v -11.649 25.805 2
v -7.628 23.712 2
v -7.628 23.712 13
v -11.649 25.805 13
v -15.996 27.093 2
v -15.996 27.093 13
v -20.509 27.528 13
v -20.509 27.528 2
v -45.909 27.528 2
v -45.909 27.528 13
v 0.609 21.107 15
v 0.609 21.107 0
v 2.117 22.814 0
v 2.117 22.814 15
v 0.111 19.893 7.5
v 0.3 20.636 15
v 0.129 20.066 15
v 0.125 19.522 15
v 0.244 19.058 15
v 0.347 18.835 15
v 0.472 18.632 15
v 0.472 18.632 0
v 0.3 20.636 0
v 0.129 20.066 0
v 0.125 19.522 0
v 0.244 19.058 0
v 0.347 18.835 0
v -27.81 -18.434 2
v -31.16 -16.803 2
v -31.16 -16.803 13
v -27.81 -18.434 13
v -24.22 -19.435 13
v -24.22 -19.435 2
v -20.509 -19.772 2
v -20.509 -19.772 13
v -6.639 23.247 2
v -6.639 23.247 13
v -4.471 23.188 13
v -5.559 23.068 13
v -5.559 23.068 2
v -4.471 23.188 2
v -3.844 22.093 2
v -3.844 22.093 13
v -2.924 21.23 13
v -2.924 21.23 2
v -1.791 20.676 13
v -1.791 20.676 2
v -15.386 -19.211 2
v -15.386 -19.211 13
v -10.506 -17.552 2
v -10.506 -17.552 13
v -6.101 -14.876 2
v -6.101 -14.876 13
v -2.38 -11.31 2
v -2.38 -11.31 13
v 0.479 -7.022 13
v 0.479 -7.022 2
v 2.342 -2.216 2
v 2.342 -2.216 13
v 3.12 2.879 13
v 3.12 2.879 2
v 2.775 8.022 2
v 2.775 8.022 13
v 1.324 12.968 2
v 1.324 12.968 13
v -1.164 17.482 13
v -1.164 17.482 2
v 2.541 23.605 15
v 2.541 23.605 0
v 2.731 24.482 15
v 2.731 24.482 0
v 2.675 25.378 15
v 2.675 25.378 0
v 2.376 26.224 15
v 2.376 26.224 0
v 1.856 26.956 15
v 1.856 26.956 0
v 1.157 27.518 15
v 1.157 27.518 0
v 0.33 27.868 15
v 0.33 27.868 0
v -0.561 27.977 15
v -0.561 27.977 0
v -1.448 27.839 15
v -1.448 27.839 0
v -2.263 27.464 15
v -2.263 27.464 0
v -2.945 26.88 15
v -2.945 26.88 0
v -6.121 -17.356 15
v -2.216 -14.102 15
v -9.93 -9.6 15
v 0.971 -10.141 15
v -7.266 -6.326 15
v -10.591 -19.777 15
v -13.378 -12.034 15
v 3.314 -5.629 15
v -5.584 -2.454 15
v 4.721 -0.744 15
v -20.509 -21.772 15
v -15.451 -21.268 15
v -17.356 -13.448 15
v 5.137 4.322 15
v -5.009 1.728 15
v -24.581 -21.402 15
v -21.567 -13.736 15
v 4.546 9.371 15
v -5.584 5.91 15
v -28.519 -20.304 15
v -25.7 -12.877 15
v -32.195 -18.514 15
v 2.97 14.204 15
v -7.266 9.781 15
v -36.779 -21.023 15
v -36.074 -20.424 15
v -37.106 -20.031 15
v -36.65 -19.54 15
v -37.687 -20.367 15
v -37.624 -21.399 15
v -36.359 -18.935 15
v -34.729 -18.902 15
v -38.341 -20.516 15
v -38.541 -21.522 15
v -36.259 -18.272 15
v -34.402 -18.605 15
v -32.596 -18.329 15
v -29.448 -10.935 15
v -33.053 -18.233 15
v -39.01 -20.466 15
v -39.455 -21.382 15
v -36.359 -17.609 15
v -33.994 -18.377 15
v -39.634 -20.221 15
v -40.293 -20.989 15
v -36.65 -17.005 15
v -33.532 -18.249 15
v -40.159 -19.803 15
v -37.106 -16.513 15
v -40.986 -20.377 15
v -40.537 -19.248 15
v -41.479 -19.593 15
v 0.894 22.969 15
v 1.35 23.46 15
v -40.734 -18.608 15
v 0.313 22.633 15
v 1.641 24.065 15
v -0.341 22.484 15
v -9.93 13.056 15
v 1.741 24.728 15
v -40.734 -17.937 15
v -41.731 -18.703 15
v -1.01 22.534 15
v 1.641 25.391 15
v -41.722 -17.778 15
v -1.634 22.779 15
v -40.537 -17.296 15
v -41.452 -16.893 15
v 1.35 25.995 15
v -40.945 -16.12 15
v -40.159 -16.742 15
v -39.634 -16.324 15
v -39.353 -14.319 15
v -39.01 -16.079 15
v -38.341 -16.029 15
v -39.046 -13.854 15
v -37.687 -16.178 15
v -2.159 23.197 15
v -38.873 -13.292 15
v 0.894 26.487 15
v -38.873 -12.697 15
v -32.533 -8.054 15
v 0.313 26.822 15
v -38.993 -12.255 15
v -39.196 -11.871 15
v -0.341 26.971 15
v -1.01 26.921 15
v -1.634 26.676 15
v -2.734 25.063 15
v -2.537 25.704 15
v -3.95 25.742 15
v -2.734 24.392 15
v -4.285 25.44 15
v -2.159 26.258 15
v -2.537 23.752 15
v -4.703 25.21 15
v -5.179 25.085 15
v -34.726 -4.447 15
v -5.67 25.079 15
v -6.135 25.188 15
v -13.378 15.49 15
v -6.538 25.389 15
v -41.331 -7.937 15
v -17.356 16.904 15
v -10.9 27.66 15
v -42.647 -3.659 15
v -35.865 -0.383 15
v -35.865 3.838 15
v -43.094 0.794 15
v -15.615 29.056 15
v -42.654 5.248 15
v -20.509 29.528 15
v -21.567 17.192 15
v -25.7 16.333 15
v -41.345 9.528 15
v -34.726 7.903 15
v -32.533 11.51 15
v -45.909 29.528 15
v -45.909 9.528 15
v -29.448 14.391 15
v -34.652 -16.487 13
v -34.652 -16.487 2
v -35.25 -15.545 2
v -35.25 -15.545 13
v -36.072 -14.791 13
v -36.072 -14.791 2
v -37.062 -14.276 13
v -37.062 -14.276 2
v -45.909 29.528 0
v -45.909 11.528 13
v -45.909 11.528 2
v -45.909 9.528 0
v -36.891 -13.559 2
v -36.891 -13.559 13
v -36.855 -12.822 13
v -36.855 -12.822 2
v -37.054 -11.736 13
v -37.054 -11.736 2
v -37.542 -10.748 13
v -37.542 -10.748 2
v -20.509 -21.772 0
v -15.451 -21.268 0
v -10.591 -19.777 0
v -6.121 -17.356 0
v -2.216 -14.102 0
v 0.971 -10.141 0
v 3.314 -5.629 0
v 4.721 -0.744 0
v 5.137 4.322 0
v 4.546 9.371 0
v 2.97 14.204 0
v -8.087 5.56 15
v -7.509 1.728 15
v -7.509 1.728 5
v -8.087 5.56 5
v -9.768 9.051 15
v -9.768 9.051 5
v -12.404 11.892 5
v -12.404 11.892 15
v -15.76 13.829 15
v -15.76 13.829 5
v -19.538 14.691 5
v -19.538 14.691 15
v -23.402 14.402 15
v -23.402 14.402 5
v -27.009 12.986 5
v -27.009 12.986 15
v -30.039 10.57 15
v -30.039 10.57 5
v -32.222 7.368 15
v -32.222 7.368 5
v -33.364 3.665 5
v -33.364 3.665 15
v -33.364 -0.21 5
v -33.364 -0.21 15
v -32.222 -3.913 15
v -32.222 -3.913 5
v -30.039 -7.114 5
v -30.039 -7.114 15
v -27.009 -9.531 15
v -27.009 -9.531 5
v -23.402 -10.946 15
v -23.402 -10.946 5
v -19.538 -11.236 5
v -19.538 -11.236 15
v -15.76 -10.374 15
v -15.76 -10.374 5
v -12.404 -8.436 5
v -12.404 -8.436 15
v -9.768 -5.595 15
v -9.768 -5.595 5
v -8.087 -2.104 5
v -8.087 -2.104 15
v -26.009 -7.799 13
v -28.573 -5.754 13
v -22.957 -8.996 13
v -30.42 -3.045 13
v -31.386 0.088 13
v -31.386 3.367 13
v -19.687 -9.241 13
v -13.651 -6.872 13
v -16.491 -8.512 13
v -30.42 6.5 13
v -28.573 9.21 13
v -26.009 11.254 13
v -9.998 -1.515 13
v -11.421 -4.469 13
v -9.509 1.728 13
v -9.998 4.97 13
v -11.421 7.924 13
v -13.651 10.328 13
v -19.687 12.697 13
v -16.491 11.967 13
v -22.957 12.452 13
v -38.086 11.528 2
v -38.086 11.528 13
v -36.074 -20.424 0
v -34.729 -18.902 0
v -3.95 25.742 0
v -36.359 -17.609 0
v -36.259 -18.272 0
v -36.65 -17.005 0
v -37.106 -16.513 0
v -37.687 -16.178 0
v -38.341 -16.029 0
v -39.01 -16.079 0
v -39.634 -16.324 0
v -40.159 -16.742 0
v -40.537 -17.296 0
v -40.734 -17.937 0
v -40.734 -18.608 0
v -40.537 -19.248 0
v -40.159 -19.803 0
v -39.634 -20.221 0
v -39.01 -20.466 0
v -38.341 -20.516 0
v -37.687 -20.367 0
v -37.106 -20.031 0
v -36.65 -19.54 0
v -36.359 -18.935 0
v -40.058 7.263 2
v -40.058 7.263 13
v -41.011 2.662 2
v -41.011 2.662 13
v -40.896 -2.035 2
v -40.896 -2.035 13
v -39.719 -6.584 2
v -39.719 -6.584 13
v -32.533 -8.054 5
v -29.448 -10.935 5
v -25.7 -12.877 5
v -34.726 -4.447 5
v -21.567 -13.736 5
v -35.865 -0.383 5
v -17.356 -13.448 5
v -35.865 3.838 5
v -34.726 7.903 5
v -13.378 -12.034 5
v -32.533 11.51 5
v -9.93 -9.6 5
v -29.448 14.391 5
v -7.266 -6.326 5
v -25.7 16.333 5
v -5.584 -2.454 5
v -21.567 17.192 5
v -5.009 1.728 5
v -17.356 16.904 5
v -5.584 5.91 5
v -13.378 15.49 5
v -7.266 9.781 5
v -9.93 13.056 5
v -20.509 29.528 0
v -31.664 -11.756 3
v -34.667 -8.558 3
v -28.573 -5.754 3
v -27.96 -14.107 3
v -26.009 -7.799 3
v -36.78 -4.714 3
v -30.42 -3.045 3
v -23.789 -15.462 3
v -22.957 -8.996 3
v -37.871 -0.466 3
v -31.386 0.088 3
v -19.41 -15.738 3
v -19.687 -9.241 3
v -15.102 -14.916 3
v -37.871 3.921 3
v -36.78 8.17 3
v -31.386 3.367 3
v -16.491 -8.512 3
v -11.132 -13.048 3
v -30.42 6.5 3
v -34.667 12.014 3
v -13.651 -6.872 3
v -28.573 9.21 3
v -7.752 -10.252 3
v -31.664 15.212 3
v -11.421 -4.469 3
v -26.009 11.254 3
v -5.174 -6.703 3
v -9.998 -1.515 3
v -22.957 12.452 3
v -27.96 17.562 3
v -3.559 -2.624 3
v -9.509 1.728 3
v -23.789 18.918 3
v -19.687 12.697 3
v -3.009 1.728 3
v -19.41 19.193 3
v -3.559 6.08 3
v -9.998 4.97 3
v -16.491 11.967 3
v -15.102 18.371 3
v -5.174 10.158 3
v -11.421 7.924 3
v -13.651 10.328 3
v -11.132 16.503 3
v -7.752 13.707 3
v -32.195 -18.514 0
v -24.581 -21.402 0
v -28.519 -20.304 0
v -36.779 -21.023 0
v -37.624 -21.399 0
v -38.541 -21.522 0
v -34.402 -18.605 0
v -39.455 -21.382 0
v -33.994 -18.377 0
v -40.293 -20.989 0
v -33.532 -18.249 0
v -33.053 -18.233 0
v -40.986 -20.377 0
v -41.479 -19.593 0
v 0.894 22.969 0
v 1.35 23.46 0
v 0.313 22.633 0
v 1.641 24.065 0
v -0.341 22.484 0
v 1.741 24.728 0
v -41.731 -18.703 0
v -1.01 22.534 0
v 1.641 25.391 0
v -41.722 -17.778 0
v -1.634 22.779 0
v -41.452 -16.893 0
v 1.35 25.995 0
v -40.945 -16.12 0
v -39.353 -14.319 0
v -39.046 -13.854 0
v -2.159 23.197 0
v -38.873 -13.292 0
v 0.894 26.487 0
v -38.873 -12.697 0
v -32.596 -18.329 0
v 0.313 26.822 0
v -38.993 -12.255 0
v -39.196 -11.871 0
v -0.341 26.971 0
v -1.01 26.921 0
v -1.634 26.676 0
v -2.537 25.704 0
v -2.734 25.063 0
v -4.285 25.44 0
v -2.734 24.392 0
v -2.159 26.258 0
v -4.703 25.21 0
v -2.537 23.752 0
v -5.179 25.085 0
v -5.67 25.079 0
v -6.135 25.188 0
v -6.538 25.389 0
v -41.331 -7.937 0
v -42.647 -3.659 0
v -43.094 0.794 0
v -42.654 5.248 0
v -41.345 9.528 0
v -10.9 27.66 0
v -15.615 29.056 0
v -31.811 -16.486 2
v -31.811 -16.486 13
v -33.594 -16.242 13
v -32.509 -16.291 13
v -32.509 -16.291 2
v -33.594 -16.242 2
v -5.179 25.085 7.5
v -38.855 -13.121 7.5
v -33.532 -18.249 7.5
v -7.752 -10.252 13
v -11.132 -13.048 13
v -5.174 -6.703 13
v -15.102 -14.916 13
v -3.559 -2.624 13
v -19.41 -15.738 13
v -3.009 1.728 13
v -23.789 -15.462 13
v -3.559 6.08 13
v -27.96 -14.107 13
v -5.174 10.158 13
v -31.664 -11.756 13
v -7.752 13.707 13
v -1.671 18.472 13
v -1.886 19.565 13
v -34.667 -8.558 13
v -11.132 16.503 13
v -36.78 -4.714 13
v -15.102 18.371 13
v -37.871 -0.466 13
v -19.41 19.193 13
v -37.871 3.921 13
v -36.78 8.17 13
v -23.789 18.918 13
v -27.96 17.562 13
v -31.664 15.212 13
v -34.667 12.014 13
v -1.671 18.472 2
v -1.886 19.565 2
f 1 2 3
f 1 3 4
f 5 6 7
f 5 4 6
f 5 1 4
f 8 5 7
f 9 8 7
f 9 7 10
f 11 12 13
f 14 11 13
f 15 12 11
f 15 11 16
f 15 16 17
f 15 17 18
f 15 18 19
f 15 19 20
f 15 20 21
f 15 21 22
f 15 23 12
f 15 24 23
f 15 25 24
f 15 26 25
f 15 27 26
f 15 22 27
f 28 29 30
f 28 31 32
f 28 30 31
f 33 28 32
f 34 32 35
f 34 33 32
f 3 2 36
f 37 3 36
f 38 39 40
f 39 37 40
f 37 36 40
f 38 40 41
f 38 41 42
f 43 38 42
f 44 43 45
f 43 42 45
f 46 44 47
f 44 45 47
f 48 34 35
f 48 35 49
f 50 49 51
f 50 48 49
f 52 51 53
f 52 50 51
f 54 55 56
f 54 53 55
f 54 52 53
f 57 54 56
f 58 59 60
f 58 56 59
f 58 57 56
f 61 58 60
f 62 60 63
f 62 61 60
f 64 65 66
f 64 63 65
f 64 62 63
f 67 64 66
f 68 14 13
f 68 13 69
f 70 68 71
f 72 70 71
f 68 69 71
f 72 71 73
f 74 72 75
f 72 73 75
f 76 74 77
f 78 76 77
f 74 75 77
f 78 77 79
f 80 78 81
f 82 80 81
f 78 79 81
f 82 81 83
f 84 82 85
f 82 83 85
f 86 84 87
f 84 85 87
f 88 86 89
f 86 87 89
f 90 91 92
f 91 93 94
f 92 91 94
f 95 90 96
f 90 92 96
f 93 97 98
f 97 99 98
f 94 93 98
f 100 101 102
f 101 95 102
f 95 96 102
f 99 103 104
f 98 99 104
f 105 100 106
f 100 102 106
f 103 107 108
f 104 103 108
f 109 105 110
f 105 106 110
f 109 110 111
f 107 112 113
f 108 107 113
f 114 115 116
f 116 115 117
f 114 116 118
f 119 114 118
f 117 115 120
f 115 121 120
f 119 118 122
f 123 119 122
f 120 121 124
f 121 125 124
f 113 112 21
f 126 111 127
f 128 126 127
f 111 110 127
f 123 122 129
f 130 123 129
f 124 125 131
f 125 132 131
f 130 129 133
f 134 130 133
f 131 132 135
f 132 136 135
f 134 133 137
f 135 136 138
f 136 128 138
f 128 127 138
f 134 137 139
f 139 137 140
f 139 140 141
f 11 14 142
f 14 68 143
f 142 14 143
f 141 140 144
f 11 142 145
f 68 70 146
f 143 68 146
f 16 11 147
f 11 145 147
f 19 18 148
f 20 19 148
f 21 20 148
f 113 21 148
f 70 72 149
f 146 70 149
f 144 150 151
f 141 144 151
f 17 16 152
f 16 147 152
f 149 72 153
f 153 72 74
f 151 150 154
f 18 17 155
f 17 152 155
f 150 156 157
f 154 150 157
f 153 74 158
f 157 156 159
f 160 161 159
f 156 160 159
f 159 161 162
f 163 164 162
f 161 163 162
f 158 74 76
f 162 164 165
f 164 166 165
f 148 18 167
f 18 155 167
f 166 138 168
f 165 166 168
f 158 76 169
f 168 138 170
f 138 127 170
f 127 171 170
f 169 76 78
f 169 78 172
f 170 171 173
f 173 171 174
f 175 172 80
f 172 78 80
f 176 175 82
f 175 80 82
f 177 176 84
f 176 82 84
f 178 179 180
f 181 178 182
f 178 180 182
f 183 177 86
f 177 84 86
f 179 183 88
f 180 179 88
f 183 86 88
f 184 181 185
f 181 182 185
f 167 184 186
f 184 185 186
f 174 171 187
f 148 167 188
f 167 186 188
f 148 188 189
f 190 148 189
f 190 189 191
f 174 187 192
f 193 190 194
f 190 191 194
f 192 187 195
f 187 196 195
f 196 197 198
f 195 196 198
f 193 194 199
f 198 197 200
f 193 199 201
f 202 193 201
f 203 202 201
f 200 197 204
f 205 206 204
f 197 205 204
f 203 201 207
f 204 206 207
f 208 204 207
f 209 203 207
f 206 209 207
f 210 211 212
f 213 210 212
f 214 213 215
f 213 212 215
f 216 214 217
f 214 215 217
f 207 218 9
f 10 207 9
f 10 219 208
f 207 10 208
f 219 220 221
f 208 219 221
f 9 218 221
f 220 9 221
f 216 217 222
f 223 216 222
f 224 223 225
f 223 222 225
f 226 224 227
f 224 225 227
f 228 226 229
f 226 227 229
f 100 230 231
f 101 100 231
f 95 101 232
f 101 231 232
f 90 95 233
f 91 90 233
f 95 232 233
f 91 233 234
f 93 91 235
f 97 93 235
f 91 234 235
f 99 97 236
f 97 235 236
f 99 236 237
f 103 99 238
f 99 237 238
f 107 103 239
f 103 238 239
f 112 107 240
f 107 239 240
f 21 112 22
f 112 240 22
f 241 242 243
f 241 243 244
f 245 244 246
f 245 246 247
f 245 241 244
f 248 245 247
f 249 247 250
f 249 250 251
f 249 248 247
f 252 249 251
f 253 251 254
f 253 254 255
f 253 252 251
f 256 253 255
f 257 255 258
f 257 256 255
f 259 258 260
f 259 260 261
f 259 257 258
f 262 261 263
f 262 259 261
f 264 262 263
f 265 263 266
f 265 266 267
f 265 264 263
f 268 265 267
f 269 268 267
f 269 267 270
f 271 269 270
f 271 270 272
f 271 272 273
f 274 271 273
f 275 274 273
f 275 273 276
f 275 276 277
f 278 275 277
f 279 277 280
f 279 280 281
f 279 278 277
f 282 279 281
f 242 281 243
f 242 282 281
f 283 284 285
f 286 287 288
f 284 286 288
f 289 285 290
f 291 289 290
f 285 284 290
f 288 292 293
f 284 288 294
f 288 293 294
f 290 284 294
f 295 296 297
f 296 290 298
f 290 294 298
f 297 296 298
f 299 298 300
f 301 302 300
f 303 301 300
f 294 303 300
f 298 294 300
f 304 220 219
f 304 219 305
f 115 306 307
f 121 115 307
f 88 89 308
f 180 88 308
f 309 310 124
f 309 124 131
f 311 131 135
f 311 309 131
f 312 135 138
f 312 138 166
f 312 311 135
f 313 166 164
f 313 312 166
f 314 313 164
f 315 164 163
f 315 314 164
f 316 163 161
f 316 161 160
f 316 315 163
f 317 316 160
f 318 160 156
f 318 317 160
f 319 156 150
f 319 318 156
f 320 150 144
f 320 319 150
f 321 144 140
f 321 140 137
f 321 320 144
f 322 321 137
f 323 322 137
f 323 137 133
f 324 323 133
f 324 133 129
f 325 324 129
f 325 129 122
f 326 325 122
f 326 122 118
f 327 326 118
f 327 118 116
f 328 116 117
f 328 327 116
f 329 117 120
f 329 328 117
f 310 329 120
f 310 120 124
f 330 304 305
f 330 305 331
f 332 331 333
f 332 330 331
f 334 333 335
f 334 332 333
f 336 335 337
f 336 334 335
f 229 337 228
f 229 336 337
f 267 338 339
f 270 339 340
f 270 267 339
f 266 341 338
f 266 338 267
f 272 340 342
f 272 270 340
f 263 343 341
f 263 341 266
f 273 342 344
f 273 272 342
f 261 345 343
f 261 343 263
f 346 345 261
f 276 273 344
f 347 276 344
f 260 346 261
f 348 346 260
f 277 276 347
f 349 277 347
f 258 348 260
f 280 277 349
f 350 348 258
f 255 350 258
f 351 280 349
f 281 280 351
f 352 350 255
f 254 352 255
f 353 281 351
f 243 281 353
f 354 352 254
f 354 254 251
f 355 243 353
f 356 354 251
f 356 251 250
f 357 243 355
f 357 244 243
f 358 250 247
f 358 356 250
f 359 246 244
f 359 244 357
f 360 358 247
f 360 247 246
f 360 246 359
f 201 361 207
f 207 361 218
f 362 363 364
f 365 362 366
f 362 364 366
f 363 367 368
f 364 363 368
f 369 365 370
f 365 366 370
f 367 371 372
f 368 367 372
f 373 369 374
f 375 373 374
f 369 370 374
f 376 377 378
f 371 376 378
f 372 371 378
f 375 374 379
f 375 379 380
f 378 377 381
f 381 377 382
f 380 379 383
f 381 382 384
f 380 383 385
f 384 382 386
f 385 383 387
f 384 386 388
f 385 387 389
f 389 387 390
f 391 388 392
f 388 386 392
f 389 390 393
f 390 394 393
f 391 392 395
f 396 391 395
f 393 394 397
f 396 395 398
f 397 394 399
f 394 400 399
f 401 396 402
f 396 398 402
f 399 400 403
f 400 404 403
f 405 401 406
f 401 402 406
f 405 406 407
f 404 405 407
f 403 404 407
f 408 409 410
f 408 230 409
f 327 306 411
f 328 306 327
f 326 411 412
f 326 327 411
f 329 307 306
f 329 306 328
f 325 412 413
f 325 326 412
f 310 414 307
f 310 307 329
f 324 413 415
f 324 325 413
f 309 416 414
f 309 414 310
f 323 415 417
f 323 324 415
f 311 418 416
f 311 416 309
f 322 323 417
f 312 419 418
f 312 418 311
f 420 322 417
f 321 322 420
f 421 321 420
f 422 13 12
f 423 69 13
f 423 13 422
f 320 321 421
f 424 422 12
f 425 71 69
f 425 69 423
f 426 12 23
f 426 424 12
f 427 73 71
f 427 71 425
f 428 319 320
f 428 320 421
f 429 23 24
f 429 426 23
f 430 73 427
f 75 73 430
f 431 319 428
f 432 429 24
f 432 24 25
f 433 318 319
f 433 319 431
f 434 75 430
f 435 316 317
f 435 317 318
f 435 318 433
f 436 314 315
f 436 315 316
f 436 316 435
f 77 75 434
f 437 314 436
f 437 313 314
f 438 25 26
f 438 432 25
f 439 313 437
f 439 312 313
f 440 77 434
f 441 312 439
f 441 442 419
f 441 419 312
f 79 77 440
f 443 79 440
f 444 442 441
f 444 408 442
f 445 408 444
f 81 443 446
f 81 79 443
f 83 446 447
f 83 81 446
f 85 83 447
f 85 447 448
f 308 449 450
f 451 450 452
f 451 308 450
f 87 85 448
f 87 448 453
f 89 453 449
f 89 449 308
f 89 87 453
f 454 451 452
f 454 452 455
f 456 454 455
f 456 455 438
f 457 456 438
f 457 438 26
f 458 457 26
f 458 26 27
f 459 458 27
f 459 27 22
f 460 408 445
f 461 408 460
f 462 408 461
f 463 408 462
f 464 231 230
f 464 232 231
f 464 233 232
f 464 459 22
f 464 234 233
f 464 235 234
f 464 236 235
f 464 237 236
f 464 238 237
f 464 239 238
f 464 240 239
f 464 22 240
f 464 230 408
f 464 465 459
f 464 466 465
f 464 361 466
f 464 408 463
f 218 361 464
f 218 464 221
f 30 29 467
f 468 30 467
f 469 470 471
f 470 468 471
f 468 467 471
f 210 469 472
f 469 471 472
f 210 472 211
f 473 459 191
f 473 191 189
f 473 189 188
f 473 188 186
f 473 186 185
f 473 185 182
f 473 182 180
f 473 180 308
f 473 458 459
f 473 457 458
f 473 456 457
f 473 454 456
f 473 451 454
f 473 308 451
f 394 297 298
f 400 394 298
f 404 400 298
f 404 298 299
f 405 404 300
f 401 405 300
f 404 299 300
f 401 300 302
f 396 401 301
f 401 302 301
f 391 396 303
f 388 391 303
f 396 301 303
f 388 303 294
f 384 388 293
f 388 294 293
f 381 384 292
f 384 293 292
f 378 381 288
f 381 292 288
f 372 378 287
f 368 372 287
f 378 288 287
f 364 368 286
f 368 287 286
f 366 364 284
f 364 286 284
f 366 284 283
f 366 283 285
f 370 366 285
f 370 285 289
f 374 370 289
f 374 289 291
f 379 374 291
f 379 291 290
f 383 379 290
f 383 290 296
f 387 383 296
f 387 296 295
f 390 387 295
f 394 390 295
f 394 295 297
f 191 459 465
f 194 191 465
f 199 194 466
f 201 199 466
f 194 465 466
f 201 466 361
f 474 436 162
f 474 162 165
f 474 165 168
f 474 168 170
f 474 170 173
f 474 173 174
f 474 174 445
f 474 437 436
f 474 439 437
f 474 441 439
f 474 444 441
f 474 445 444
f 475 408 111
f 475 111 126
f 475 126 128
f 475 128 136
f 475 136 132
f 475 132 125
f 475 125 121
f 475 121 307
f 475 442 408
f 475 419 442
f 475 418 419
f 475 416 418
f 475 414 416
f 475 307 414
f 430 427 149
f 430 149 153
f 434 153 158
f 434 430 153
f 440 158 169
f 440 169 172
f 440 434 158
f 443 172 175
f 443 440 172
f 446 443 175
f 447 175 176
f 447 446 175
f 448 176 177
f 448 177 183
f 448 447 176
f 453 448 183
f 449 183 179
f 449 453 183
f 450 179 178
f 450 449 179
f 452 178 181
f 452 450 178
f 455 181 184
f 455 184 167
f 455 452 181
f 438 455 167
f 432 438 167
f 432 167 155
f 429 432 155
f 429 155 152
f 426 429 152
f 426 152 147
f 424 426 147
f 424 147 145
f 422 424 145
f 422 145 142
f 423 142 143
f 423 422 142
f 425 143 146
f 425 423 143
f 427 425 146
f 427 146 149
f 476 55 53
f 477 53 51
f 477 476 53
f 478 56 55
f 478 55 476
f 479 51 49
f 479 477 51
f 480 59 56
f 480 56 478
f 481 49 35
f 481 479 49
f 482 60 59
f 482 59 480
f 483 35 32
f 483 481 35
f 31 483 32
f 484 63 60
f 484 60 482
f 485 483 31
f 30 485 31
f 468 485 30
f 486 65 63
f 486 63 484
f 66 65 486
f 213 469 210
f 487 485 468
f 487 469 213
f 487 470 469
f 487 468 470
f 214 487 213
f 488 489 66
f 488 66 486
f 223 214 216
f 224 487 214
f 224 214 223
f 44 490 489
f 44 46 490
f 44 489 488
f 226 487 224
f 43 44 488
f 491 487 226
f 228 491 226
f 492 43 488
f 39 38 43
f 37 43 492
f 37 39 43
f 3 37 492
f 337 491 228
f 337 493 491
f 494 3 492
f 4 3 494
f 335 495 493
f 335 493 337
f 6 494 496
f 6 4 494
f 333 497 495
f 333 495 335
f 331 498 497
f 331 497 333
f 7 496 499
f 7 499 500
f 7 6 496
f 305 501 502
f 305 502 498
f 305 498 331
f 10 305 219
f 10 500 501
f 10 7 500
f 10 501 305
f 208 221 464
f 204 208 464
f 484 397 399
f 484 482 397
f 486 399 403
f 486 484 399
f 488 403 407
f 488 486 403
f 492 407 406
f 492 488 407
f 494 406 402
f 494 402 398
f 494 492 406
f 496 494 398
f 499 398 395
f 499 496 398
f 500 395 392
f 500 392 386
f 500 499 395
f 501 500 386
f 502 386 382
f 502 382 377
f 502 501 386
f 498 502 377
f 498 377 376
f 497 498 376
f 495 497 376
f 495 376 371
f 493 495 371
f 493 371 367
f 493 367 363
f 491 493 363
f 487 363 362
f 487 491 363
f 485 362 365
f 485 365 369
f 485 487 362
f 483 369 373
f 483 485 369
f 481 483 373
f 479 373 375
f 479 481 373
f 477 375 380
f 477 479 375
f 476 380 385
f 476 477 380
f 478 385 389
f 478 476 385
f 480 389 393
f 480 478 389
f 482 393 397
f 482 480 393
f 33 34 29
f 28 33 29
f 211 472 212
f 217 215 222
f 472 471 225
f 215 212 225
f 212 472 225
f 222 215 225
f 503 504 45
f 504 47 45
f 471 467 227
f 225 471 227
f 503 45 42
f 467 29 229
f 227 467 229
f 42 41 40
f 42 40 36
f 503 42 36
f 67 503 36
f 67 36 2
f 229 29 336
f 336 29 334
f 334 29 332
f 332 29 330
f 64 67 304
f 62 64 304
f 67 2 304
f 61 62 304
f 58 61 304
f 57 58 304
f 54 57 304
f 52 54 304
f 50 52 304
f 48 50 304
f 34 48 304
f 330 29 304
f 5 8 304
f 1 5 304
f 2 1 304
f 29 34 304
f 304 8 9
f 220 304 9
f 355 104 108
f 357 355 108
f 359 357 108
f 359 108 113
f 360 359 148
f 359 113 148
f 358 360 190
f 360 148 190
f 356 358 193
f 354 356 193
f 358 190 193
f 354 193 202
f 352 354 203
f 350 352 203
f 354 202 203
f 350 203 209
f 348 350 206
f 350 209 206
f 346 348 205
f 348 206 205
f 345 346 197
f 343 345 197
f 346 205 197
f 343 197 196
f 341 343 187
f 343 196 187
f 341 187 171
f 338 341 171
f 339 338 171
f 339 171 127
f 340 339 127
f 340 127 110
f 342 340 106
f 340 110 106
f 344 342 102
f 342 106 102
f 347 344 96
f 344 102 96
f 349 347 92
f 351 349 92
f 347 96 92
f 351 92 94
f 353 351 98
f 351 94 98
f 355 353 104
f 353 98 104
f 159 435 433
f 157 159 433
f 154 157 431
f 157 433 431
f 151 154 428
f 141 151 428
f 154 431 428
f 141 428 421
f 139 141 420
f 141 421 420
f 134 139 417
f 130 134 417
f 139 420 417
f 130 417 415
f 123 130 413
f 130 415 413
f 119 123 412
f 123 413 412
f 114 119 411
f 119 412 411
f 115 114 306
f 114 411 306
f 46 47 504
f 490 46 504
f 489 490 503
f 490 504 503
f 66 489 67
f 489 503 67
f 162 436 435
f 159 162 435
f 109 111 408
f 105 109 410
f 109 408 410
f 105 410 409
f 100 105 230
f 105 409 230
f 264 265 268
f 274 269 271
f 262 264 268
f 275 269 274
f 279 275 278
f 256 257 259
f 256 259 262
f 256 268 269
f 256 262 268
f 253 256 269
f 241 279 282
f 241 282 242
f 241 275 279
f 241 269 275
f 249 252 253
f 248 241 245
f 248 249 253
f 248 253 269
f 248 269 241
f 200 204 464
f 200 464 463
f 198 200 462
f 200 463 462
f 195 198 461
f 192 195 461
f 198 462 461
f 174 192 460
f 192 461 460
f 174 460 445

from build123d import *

# Parameters (mm, degrees)
SKETCH_1_R          = 2.25
SKETCH_1_R_2        = 13
EXTRUDE_1_DEPTH     = 15
EXTRUDE_START       = -15
SKETCH_2_R          = 13
EXTRUDE_2_DEPTH     = 15
SKETCH_3_R          = 15.5
SKETCH_3_R_2        = 13
CUT_EXTRUDE_1_DEPTH = 10
FILLET_2_R          = 2
SHELL_1_T           = -2


with BuildPart() as part:
    # 草图1 → 凸台-拉伸1 (new body)
    with BuildSketch(Plane.XY):
        with BuildLine():
            Line((-20.509328188, 29.527748201), (-45.909328188, 29.527748201))
            Line((-45.909328188, 29.527748201), (-45.909328188, 9.527748201))
            Line((-45.909328188, 9.527748201), (-41.345035516, 9.527748201))
            ThreePointArc((-41.345035516, 9.527748201), (-42.891279982, -2.208471939), (-38.288719604, -13.114716624))
            Line((-38.288719604, -13.114716624), (-40.944647776, -16.120109029))
            ThreePointArc((-40.944647776, -16.120109029), (-40.661470992, -20.707571357), (-36.07400866, -20.424394637))
            Line((-36.07400866, -20.424394637), (-33.582654856, -17.603814511))
            ThreePointArc((-33.582654856, -17.603814511), (-27.370227174, -20.704922292), (-20.509328188, -21.772251799))
            ThreePointArc((-20.509328188, -21.772251799), (2.605029944, -7.24200666), (-0.468314839, 19.886504679))
            Line((-0.468314839, 19.886504679), (2.117446855, 22.813968467))
            ThreePointArc((2.117446855, 22.813968467), (1.525885658, 27.261599934), (-2.944647715, 26.87989104))
            Line((-2.944647715, 26.87989104), (-5.1306618, 24.406243523))
            ThreePointArc((-5.1306618, 24.406243523), (-12.404804913, 28.213713407), (-20.509328188, 29.527748201))
        make_face()
        with Locations((-38.509328188, -18.272251799)):
            Circle(SKETCH_1_R, mode=Mode.SUBTRACT)
        with Locations((-0.509328188, 24.727748201)):
            Circle(SKETCH_1_R, mode=Mode.SUBTRACT)
        with Locations((-20.509328188, 1.727748201)):
            Circle(SKETCH_1_R_2, mode=Mode.SUBTRACT)
    extrude(amount=EXTRUDE_1_DEPTH)

    # 草图2 → 凸台-拉伸2 (add)
    with BuildSketch(Plane.XY.offset(15).offset(EXTRUDE_START)):
        with Locations((-20.509328188, 1.727748201)):
            Circle(SKETCH_2_R)
    extrude(amount=EXTRUDE_2_DEPTH)

    # 草图3 → 切除-拉伸1 (cut)
    with BuildSketch(Plane.XY.offset(15)):
        with Locations((-20.509328188, 1.727748201)):
            Circle(SKETCH_3_R)
        with Locations((-20.509328188, 1.727748201)):
            Circle(SKETCH_3_R_2, mode=Mode.SUBTRACT)
    extrude(amount=-CUT_EXTRUDE_1_DEPTH, mode=Mode.SUBTRACT)

    # 变化圆角2
    fillet_2_edges = [part.edges().sort_by_distance(p)[0] for p in [
        (-5.1306618, 24.406243523, 7.5),
        (-0.468314839, 19.886504679, 7.5),
        (-38.288719604, -13.114716624, 7.5),
        (-33.582654856, -17.603814511, 7.5),
    ]]
    fillet(fillet_2_edges, radius=FILLET_2_R)

    # 抽壳1
    shell_1_openings = [part.faces().sort_by_distance(p)[0] for p in [
        (-45.909328188, 19.527748201, 7.5),
    ]]
    offset(amount=SHELL_1_T, openings=shell_1_openings, kind=Kind.INTERSECTION)


solid = part.part
